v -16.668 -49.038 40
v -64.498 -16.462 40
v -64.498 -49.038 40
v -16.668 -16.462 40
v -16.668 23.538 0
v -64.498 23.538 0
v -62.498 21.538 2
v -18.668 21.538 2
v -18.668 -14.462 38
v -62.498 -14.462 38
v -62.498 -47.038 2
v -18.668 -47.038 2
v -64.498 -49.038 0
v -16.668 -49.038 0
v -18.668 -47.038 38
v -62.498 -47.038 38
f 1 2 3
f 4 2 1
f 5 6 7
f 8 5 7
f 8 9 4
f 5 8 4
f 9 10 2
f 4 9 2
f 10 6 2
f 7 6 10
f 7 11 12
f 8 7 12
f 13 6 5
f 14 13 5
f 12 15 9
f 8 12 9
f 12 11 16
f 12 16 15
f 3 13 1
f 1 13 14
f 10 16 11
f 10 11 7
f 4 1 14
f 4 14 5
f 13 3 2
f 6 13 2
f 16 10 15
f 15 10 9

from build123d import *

# Parameters (mm, degrees)
F0_W        = 47.8297565132
F0_H        = 76.5759237111
F1_DEPTH    = 40
F2_T1_DEPTH = 274.1378594542
F3_T        = -2


# Not quite as in the source:
# - a fillet or chamfer that OpenCascade refuses, or shapes differently, is made with other operations: its cross-section is extruded or revolved along the edge and cut away or added


with BuildPart() as f1:
    # F0 (on Top) → F1 (new body)
    with BuildSketch(Plane.XY):
        with Locations((-40.5828235671, -10.7496175915)):
            Rectangle(F0_W, F0_H)
    extrude(amount=F1_DEPTH)

    # F2: chamfer of 44 on 1 edges, made by hand

    # F2_s2 → F2_t1 (cut)
    with BuildSketch(Plane.YZ.offset(-177.6517532942)):
        Polygon((27.538344264, -4), (-16.461655736, 40), (27.538344264, 40), align=None)
    extrude(amount=F2_T1_DEPTH, mode=Mode.SUBTRACT)

    # F3
    f3_openings = [f1.faces().sort_by_distance(p)[0] for p in [
        (-40.582824, 3.538344, 20),
    ]]
    offset(amount=F3_T, openings=f3_openings, kind=Kind.INTERSECTION)


solid = f1.part
